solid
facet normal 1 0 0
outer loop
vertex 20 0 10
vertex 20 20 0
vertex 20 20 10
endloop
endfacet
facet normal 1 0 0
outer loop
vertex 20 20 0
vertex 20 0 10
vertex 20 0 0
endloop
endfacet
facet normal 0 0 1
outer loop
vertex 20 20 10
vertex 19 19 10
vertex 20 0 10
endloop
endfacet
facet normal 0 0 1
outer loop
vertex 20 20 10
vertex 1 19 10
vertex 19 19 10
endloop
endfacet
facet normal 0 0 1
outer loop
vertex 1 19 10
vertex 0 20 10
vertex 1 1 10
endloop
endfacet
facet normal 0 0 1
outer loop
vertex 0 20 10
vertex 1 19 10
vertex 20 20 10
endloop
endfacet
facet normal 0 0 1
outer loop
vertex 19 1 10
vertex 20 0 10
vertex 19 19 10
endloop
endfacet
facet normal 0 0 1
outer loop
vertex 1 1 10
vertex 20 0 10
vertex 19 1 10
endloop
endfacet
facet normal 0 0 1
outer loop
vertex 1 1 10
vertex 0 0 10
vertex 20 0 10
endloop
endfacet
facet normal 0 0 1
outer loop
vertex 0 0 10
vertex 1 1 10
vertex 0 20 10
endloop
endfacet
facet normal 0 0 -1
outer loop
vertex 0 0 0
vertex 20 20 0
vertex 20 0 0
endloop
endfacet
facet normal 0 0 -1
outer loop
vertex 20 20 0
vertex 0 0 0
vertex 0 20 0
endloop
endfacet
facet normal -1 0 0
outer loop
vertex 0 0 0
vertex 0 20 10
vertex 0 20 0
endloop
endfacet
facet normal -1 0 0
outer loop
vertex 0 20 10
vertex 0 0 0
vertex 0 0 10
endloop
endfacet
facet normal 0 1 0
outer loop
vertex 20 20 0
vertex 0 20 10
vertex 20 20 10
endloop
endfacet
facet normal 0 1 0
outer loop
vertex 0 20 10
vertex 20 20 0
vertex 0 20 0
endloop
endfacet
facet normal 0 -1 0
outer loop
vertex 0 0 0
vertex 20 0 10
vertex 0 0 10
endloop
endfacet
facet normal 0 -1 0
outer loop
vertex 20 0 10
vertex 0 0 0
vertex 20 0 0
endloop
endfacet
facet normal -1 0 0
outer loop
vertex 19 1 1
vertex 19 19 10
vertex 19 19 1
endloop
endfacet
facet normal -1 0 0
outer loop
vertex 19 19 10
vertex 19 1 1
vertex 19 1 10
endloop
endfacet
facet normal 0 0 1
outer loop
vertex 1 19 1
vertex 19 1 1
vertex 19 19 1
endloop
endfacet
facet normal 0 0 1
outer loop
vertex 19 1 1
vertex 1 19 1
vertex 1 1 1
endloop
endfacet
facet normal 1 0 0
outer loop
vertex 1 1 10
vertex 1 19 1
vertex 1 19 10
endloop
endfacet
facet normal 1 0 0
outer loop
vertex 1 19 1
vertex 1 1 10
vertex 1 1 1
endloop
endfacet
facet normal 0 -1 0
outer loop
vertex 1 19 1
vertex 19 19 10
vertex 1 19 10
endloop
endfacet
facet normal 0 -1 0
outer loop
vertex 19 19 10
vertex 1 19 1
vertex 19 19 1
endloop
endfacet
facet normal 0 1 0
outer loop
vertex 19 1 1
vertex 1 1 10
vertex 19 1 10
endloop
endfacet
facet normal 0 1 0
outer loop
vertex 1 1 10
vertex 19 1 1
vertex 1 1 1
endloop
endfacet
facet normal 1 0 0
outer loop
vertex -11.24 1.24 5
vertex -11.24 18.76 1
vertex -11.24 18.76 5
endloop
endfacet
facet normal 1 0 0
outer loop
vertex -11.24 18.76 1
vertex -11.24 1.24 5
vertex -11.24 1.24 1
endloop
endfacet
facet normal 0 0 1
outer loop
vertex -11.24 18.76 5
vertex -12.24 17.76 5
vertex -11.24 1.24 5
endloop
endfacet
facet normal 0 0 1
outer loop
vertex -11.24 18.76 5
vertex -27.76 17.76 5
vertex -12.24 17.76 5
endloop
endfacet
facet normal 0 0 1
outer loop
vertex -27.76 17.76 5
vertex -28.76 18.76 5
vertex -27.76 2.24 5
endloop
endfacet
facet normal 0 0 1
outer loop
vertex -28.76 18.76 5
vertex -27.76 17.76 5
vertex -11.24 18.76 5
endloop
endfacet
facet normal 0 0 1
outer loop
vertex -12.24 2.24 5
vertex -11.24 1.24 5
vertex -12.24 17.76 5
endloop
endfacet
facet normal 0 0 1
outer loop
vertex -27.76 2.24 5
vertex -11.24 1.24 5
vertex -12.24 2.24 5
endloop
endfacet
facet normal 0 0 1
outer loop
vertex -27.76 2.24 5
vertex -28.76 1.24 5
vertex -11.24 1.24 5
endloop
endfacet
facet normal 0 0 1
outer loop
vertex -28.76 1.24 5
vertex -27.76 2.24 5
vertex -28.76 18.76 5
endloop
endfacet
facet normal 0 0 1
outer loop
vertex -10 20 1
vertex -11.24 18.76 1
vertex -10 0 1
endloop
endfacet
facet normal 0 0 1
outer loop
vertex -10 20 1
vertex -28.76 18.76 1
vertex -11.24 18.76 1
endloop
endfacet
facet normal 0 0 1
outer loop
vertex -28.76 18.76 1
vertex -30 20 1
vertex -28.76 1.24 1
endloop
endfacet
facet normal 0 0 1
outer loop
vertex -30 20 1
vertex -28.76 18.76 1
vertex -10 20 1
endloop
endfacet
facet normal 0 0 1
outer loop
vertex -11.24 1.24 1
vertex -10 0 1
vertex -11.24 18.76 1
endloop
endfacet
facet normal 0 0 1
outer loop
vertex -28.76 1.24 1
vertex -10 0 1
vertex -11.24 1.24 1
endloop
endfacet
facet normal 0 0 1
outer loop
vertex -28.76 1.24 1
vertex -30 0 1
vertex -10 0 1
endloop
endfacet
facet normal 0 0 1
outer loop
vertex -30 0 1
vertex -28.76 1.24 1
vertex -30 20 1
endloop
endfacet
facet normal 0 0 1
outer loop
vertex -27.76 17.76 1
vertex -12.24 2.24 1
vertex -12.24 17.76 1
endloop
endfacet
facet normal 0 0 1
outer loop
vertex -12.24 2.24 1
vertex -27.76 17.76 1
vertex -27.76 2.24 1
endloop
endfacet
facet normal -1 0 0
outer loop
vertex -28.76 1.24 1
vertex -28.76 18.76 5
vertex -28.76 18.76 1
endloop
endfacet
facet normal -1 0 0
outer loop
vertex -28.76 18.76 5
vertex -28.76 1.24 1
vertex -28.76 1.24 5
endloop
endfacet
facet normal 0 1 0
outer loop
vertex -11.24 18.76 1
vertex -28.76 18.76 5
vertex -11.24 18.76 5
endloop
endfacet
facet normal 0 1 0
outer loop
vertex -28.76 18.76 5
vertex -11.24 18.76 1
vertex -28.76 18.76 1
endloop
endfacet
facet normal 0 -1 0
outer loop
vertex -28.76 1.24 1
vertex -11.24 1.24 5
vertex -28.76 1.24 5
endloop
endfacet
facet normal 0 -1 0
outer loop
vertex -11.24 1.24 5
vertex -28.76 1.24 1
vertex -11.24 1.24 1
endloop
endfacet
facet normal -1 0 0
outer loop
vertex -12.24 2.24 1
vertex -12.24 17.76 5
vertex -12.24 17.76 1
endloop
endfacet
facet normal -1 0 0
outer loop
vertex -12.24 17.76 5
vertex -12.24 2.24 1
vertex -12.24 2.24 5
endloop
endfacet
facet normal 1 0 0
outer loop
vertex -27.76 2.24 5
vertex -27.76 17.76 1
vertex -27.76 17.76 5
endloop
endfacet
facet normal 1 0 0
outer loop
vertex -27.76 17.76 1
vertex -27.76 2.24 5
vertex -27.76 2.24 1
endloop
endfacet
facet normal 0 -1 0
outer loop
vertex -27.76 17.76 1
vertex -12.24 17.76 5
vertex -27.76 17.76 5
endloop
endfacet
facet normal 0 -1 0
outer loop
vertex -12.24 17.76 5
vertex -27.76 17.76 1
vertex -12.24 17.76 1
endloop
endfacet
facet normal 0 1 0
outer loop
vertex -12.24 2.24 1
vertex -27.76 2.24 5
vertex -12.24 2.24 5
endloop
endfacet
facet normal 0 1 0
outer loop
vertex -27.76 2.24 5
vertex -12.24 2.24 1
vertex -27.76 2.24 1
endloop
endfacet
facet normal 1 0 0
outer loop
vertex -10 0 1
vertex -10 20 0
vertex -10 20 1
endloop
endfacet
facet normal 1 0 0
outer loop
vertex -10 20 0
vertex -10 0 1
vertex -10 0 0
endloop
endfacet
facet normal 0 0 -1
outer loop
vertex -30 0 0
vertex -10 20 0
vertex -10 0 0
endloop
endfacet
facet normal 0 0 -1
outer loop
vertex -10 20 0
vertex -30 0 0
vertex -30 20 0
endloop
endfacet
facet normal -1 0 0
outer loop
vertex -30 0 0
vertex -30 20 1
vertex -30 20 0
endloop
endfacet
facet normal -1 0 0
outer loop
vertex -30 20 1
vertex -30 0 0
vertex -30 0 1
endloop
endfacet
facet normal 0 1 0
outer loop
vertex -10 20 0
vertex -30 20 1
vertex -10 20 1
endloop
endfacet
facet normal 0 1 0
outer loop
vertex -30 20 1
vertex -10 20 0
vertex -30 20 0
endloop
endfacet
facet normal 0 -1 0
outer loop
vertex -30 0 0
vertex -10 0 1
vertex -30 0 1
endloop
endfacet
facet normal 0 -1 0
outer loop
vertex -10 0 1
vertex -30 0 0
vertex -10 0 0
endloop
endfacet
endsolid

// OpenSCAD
// Customizable box with lid
// by Hari Wiguna, Oct 2013

// Box Width (mm)
boxX = 20;

// Box Depth (mm)
boxY = 20;

// Box Height (mm)
boxZ = 10;

// Wall Thickness (mm)
wallT = 1;

// Lid lip height (mm)
lidZ = 5;

// (mm. Smaller number means tighter fit)
lidClearance = 0.24;

// Choose No if you're just tweaking the lid clearance
printBox = 1; // [1:Yes,0:No]

printLid = 1; // [1:Yes,0:No]

t2 = wallT * 2;
t4 = wallT * 4;

// Generate Box & Lid
union()
{
	Box();
	translate([-boxX-10,0,0]) Lid();
}

module Box()
{
	if (printBox==1)
	difference()
	{
		// Outer box
		cube([boxX, boxY, boxZ]);

		// Subtract inner void
		translate([wallT, wallT, wallT])
			cube([boxX-t2,boxY-t2,boxZ]);
	}
}

module Lid()
{
	if (printLid==1)
	union()
	{
		cube([boxX, boxY, wallT]);
		LidInset(boxX, boxY, lidZ);
	}
}

module LidInset(x,y,z)
{
	f = lidClearance;
	translate([wallT+f, wallT+f, wallT])
	difference()
	{
		cube([x-2*(wallT+f), y-2*(wallT+f), z-wallT]);

		translate([wallT,wallT,0])
			cube([x-t4-(2*f), y-t4-(2*f), z]);
	}
}
